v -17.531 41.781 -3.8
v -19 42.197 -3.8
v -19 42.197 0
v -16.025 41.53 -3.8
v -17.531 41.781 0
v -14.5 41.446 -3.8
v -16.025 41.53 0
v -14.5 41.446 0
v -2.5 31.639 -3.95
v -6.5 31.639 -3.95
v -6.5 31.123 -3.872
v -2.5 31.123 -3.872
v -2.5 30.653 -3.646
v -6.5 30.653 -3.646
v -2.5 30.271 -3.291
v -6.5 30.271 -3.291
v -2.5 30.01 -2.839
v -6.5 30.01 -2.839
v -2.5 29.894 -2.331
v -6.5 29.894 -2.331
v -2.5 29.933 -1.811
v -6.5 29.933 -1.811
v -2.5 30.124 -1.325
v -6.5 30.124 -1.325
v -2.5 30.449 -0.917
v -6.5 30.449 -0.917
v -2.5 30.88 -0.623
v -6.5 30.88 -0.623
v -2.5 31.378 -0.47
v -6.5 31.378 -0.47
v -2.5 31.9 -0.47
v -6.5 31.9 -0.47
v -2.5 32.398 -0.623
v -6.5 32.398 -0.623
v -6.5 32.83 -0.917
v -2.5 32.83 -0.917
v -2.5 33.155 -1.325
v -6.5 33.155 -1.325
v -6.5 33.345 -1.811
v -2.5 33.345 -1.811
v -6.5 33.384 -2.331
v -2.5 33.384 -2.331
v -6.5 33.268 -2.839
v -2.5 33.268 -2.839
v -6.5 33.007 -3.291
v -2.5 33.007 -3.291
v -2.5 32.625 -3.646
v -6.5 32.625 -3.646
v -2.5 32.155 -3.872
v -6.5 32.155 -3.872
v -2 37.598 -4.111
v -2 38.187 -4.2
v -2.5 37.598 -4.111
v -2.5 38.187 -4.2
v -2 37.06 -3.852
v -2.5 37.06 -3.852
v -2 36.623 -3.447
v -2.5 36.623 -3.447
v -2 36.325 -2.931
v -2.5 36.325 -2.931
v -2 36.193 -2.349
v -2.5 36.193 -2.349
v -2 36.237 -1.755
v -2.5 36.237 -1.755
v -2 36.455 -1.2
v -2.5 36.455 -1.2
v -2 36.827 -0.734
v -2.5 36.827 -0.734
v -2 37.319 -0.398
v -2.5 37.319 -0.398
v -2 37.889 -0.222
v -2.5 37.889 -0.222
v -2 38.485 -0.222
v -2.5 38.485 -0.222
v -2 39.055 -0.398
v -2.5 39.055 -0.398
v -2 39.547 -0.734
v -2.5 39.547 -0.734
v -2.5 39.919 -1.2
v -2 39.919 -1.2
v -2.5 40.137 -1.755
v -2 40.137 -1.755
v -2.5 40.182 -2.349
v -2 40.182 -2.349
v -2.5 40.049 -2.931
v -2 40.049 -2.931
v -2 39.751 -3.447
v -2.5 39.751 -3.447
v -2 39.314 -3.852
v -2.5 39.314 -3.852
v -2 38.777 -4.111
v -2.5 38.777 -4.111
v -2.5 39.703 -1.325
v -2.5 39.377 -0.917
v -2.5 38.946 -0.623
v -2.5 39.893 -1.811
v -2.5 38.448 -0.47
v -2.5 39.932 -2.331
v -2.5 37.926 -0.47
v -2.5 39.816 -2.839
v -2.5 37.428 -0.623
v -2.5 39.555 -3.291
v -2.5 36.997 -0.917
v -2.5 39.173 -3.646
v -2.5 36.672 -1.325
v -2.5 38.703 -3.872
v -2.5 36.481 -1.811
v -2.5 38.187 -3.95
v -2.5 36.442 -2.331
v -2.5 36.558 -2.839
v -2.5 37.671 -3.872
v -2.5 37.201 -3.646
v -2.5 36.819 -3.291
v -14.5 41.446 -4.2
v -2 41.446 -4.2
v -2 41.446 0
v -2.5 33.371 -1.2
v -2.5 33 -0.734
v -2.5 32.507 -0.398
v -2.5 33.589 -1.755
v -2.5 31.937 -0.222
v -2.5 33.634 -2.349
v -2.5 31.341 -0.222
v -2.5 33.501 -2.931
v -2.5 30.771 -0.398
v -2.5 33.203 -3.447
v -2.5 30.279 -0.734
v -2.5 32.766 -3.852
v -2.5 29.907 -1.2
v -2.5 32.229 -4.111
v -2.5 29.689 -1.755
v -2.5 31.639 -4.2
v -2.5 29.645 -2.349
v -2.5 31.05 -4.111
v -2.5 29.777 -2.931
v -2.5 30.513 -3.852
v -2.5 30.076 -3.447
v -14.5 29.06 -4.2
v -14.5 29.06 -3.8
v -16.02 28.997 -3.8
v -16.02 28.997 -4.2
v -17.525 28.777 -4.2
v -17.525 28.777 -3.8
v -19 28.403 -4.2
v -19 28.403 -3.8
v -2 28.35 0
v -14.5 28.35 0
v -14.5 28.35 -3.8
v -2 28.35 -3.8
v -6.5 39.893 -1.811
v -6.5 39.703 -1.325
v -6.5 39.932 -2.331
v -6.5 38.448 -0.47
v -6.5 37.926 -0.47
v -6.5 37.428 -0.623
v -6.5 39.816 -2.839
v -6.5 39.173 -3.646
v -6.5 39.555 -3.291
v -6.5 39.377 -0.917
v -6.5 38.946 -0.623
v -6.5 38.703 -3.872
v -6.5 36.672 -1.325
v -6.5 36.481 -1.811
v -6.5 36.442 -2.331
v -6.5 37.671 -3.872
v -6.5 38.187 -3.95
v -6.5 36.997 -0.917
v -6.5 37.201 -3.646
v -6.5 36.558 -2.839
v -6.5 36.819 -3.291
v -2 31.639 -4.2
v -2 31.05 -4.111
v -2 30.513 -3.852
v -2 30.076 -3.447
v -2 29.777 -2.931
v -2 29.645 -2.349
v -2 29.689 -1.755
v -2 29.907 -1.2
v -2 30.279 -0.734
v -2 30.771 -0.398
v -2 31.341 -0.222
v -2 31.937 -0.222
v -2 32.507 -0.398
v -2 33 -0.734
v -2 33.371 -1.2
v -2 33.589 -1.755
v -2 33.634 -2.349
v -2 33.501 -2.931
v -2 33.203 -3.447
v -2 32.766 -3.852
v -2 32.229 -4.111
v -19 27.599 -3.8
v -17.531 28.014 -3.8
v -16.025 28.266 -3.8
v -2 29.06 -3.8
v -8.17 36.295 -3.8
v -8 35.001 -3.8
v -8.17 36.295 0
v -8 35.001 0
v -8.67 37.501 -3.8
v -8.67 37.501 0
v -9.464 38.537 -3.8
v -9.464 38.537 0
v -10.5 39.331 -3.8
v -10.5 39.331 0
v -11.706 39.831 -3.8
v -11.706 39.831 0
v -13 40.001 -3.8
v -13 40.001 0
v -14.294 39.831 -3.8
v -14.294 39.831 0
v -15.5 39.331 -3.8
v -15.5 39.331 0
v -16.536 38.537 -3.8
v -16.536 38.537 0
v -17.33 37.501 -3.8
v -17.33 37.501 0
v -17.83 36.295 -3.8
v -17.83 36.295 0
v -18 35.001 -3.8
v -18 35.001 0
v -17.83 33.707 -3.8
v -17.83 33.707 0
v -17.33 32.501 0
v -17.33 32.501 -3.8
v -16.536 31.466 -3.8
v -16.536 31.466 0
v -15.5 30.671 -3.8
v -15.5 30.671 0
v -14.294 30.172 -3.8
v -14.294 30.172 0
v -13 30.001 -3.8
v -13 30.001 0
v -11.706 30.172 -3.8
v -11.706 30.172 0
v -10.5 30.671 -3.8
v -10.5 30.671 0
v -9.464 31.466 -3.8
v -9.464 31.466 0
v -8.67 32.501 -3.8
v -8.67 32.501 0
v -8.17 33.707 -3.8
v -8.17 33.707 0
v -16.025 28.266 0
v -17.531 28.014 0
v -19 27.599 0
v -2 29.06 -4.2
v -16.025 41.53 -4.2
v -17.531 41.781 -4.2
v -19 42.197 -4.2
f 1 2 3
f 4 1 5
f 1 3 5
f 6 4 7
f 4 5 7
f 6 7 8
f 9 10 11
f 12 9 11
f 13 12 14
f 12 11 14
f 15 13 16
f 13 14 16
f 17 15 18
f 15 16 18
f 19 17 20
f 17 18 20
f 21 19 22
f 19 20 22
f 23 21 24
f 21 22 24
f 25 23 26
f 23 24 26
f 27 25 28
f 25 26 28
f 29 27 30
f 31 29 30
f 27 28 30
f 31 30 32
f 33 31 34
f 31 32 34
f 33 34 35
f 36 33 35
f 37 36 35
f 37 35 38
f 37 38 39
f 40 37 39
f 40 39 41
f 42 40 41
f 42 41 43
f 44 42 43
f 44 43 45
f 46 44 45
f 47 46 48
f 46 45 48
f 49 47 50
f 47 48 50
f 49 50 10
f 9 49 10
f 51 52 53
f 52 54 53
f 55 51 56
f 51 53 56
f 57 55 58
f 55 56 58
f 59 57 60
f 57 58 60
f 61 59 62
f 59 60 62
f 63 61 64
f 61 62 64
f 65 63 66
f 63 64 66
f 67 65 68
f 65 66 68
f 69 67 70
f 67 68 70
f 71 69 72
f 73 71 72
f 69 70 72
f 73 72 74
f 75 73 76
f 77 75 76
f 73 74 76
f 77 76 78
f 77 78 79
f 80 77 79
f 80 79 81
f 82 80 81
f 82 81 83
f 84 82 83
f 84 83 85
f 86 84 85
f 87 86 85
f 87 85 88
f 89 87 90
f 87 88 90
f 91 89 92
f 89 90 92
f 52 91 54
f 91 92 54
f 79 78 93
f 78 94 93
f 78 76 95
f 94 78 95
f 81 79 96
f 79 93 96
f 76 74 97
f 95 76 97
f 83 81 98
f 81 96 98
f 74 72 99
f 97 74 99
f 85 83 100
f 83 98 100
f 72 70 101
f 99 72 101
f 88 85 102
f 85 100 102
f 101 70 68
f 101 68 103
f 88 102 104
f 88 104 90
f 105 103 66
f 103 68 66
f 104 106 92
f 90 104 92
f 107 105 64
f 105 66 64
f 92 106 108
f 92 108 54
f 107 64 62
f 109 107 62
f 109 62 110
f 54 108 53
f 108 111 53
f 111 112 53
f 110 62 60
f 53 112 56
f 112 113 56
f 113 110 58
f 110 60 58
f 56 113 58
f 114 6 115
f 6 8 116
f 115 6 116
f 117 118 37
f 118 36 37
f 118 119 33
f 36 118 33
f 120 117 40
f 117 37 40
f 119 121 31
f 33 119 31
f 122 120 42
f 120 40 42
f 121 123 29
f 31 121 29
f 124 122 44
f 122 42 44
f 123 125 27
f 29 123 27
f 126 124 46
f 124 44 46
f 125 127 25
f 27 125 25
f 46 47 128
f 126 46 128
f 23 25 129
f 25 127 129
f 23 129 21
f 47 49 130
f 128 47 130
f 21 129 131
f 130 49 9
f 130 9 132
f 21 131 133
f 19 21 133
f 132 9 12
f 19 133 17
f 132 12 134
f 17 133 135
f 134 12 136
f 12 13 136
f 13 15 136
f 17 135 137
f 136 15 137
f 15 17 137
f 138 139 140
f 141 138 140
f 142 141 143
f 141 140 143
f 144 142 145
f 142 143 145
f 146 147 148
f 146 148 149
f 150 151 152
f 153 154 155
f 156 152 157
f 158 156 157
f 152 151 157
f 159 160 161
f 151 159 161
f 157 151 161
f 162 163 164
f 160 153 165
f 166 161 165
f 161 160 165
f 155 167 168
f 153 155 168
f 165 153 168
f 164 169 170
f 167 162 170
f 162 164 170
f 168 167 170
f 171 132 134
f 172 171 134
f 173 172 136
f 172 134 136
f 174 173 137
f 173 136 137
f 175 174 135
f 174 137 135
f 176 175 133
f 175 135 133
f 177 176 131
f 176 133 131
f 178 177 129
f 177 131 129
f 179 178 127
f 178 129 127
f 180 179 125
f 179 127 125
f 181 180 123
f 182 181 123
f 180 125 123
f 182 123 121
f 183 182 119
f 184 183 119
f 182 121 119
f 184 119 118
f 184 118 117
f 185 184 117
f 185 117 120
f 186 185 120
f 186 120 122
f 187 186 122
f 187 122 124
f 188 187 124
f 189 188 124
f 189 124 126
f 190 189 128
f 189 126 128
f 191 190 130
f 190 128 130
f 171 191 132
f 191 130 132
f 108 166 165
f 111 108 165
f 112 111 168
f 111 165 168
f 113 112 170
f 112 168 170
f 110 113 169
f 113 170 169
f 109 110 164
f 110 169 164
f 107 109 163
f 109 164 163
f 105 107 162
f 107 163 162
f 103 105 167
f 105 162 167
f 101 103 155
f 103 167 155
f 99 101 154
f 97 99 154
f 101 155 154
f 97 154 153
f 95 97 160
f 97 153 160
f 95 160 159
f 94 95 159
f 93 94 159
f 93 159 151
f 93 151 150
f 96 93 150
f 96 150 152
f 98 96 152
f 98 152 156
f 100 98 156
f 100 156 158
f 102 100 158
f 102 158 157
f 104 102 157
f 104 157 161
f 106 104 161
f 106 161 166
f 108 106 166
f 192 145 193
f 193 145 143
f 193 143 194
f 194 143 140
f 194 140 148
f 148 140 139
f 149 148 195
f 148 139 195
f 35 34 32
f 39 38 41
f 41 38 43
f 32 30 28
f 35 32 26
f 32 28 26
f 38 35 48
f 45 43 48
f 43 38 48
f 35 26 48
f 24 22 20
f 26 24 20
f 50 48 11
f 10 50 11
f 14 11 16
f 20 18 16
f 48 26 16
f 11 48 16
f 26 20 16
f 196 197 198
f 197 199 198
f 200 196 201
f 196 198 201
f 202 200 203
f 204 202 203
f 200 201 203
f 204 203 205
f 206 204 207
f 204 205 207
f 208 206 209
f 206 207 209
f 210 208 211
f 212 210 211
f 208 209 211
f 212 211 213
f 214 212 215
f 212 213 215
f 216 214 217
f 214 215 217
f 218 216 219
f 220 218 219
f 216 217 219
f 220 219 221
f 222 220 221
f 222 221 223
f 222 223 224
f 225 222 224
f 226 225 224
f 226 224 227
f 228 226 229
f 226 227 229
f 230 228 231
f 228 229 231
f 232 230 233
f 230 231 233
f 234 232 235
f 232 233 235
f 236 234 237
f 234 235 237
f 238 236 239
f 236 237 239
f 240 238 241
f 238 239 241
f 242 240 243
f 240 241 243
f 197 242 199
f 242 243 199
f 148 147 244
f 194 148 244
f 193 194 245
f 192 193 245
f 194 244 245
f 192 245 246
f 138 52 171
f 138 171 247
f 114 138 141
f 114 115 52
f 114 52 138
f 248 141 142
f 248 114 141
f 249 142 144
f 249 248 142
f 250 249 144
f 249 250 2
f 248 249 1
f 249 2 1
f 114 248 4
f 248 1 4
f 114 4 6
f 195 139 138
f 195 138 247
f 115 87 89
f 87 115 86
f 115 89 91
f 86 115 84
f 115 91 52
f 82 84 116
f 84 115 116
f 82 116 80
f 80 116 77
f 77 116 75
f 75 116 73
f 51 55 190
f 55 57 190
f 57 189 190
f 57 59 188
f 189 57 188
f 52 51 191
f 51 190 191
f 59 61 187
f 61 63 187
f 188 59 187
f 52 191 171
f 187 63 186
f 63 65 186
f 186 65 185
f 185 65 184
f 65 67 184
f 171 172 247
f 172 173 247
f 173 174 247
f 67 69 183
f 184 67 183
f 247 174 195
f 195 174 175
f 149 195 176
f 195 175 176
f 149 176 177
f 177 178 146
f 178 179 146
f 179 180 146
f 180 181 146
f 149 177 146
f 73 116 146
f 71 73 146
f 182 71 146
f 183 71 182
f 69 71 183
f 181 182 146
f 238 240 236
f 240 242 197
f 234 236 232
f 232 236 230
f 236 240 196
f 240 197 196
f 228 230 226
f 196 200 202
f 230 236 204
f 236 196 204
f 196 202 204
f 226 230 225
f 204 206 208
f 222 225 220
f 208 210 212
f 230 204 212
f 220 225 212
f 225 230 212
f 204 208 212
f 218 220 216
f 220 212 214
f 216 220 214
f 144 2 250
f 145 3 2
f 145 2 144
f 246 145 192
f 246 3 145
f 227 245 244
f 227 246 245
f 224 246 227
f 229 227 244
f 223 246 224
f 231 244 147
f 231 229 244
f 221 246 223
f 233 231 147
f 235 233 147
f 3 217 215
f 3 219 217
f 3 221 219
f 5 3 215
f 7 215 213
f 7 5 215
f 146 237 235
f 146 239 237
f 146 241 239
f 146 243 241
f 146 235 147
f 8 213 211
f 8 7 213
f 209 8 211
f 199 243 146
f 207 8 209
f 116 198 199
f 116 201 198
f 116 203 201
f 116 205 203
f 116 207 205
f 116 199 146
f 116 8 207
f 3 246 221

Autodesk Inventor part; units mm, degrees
ref_plane "YZ Plane" through (0, 0, 0) normal (1, 0, 0) x (0, 1, 0)
ref_plane "XZ Plane" through (0, 0, 0) normal (0, 1, 0) x (-1, 0, 0)
ref_plane "XY Plane" through (0, 0, 0) normal (0, 0, 1) x (1, 0, 0)
sketch "Sketch1" plane through (0, 0, 0) normal (0, 0, 1) x (1, 0, 0)
  circle A0 centre (-14.5, 55.2958) radius 13.85 projected
  circle A1 centre (-14.5, 55.2958) radius 14.5 projected
  circle A2 centre (-14.5, 14.5) radius 13.85 projected
  circle A3 centre (-14.5, 14.5) radius 14.5 projected
  circle A4 centre (-13, 35.0012) radius 5 projected
  line L0 (0, 65.2958) -> (-19, 65.2958)
  line L1 (-19, 65.2958) -> (-19, -1.7042)
  line L2 (-19, -1.7042) -> (0, -1.7042)
  line L3 (0, -1.7042) -> (0, 65.2958)
  line L4 (-2, 65.2958) -> (-2, -1.7042)
  line L5 (-14.5, 41.4458) -> (-2, 41.4458)
  line L6 (-14.5, 40.7958) -> (-2, 40.7958)
  line L7 (-14.5, 28.35) -> (-2, 28.35)
  line L8 (-14.5, 29) -> (-2, 29)
  point P0 (0, 0)
  point P1 (-19, 42.1973)
  point P2 (-19, 27.5986)
  point P3 (-19, 28.284)
  point P4 (-19, 41.5118)
  dimension "d0" = 67
  dimension "d1" = 1
  dimension "d2" = 2
extrude "Extrusion1" add sketch "Sketch1" against normal blind 3.8 contours L5 A1 L1 A0 | L5 L4 L6 A1 | A1 L6 L4 L8 A3 L1 | A3 L7 A2 L1 | L4 L7 A3 L8
ref_plane "Work Plane7" through (0, 0, -3.8) normal (0, 0, -1) x (-1, 0, 0)
sketch "Sketch2" plane through (0, 0, -3.8) normal (0, 0, -1) x (-1, 0, 0)
  circle A0 centre (8.5216, 9.2187) radius 1.0564 projected
  circle A1 centre (20.7784, 19.5033) radius 1.0564 projected
  circle A2 centre (14.65, 14.361) radius 5 projected
  circle A3 centre (14.65, 14.361) radius 14 projected
  circle A4 centre (14.65, 14.361) radius 14.7 projected
  line L0 (2, 41.4458) -> (2, 28.35) projected
  line L1 (2, 28.35) -> (14.5, 28.35) projected
  arc A5 (19, 27.5986) -> (14.5, 28.35) centre (14.5, 14.5) ccw projected
  line L2 (19, 27.5986) -> (19, 42.1973) projected
  arc A6 (14.5, 41.4458) -> (19, 42.1973) centre (14.5, 55.2958) ccw projected
  line L3 (14.5, 41.4458) -> (2, 41.4458) projected
  circle A7 centre (13, 35.0012) radius 5 projected
  line L4 (14.5, 29.0603) -> (2, 29.0603)
  line L5 (2, 41.4458) -> (2, 28.35) projected
  line L6 (14.5, 29.0603) -> (14.5, 14.5)
  point P0 (0, 0)
  point P1 (2, 29.0603)
  point P2 (19, 28.4027)
extrude "Extrusion4" add sketch "Sketch2" along normal blind 0.4 contours A4 L4 L0 L3 A6 L2 | A7
sketch "Sketch3" plane through (-2, 28.35, 0) normal (1, 0, 0) x (0, 0, -1)
  line L0 (0, 0) -> (0, 13.0958) projected
  line L1 (0, 0) -> (3.8, 0) projected
  line L2 (0, 6.5784) -> (4.4, 6.5784)
  line L3 (0, 13.0958) -> (4.4, 6.5784)
  line L4 (4.4, 6.5784) -> (0, 0)
  line L5 (0, 6.5784) -> (2.2, 3.2892)
  line L6 (0, 6.5784) -> (2.2, 9.8371)
  line L7 (0, 13.0958) -> (4.2, 13.0958) projected
  line L8 (3.8, 0.7103) -> (3.8, 0) projected
  line L9 (3.8, 0.7103) -> (4.2, 0.7103) projected
  line L10 (4.2, 13.0958) -> (4.2, 0.7103) projected
  point P0 (0, -28.35)
  point P1 (5.9, 0.65)
  point P2 (5.9, 12.4458)
  dimension "d12" = 6.5784
hole "Hole1" at (-2, 38.1871, -2.2) at (-2, 31.6392, -2.2) direction (-1, 0, 0) diameter 3.5 depth 4.5 counterbore diameter 4 counterbore depth 0.5
properties part number "BearigHoldRight"
